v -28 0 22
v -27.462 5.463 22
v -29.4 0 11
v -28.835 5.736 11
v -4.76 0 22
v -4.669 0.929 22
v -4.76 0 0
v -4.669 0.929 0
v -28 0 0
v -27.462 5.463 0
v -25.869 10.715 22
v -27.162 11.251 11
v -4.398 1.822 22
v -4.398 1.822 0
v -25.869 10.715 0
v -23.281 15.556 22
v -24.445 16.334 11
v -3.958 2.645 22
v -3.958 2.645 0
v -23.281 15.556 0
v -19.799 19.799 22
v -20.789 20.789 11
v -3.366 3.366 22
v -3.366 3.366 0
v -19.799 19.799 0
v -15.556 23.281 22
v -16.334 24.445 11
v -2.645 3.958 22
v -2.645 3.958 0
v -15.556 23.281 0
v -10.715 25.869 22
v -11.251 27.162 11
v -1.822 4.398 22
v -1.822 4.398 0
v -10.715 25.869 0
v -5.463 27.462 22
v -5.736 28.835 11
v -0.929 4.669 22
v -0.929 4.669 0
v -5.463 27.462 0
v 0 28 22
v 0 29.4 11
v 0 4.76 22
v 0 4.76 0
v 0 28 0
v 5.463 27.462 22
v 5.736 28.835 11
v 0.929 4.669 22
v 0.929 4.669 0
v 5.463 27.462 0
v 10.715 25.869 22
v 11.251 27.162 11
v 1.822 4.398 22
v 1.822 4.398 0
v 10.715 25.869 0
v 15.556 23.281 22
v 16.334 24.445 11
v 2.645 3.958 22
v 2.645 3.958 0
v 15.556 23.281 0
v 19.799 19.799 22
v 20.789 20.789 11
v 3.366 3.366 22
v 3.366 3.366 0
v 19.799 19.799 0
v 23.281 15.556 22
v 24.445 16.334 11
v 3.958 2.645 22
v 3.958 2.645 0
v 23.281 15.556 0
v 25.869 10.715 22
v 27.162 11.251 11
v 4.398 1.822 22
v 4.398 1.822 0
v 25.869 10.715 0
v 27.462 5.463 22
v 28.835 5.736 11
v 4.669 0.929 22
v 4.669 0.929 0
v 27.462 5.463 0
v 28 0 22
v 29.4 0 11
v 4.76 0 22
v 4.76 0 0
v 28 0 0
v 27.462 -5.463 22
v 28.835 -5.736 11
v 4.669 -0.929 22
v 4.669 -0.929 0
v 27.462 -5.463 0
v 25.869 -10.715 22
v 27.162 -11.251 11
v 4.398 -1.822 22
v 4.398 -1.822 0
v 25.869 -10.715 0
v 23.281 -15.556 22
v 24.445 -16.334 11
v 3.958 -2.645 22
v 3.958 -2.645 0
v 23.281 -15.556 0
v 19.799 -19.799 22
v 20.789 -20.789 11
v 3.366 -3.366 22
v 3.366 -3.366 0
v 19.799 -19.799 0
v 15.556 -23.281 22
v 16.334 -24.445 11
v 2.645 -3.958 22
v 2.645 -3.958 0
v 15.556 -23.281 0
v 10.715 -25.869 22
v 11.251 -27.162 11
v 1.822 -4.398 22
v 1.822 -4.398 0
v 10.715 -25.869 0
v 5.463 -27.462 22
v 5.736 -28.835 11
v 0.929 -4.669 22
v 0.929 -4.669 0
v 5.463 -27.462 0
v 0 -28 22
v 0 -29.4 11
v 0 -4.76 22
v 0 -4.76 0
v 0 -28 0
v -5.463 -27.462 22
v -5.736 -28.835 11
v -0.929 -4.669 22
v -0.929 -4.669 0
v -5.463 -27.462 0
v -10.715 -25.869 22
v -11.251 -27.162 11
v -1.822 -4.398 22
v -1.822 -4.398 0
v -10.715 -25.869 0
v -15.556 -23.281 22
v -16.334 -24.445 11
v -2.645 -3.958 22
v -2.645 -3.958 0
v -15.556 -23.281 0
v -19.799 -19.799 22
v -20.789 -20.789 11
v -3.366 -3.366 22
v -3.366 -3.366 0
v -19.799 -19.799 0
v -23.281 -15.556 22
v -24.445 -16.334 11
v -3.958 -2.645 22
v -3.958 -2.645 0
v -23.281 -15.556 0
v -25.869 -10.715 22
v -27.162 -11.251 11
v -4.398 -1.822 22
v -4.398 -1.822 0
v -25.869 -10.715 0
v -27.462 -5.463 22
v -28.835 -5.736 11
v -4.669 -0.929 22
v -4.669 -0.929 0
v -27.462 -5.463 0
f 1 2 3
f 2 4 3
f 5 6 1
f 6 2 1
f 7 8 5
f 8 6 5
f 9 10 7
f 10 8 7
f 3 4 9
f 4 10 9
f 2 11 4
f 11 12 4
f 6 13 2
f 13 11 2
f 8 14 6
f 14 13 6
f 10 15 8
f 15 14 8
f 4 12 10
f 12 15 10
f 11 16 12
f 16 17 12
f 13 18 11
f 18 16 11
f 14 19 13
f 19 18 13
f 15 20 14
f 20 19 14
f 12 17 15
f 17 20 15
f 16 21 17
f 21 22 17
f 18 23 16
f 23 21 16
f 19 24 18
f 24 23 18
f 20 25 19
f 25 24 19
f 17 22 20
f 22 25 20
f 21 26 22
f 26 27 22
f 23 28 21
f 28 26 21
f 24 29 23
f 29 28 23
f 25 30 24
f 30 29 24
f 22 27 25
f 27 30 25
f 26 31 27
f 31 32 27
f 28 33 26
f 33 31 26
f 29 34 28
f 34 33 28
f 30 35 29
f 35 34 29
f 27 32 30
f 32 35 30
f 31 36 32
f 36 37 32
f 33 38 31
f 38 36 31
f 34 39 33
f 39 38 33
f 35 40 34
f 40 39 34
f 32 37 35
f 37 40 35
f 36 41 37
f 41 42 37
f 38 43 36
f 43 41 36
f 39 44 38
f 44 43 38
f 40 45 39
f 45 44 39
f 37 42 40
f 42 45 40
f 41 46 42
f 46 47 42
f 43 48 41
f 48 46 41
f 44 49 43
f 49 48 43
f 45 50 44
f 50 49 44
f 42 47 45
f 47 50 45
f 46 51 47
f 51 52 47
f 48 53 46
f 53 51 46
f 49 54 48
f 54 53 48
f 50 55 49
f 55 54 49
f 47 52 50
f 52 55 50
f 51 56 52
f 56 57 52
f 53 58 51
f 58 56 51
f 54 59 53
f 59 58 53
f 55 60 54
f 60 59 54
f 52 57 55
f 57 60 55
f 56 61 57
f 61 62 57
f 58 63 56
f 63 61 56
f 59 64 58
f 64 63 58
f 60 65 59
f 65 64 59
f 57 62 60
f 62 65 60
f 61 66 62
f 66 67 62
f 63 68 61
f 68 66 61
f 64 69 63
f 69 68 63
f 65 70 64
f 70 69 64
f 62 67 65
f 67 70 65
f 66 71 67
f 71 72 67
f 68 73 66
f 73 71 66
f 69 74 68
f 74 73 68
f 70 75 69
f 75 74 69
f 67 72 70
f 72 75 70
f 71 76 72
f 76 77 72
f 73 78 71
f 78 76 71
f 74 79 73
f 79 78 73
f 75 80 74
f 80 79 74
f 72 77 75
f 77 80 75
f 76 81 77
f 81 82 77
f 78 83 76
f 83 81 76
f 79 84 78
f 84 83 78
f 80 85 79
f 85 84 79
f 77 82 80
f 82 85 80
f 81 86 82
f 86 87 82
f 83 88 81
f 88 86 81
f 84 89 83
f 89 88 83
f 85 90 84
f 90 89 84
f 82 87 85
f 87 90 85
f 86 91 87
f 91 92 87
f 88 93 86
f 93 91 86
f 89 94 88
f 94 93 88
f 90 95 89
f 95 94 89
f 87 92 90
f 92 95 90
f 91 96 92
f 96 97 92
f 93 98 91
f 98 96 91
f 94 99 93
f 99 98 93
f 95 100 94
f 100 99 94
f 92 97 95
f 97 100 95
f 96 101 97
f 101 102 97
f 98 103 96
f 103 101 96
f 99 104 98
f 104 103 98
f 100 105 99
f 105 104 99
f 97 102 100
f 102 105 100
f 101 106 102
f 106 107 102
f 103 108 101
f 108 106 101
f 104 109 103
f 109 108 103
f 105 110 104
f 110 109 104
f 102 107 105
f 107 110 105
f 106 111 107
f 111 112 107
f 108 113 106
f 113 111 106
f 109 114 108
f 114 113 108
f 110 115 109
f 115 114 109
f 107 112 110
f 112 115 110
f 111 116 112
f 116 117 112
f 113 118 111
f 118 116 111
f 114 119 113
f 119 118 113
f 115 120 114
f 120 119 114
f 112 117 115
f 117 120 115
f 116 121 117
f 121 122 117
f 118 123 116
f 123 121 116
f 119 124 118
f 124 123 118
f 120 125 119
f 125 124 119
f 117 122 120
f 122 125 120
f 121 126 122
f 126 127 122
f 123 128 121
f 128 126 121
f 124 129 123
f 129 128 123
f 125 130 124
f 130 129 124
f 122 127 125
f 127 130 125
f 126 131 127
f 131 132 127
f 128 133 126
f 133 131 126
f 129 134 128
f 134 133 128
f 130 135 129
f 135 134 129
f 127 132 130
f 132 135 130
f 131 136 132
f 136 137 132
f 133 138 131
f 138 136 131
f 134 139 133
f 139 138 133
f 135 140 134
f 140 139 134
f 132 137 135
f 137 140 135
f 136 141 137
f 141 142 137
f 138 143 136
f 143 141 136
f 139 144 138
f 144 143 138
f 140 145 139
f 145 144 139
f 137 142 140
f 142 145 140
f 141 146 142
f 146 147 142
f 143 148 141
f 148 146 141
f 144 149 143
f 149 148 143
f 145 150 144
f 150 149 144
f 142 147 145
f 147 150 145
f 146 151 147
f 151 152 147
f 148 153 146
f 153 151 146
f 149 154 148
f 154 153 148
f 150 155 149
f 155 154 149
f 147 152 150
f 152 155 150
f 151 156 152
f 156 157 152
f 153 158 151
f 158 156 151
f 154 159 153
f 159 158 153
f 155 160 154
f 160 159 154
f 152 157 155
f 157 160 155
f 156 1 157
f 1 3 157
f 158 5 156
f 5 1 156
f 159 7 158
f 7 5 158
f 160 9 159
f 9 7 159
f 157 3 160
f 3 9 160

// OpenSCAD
$fn = 32;

// ----------------------------------------------------------------------
// Belt roller: 56 mm barrel, 22 mm wide, bore 9.52 mm
// ----------------------------------------------------------------------

// --- parameters (mm) ---
bore_d = 9.52;            // bore
barrel_d = 56;            // barrel diameter
roller_w = 22;            // roller width
crown = 1.4;              // crown height at mid width

roller_profile = [[4.76, 0], [28, 0], [29.4, 11], [28, 22], [4.76, 22]];

/* the profile stays clear of the axis, so the bore comes out of the revolve */
rotate_extrude() polygon(roller_profile);
